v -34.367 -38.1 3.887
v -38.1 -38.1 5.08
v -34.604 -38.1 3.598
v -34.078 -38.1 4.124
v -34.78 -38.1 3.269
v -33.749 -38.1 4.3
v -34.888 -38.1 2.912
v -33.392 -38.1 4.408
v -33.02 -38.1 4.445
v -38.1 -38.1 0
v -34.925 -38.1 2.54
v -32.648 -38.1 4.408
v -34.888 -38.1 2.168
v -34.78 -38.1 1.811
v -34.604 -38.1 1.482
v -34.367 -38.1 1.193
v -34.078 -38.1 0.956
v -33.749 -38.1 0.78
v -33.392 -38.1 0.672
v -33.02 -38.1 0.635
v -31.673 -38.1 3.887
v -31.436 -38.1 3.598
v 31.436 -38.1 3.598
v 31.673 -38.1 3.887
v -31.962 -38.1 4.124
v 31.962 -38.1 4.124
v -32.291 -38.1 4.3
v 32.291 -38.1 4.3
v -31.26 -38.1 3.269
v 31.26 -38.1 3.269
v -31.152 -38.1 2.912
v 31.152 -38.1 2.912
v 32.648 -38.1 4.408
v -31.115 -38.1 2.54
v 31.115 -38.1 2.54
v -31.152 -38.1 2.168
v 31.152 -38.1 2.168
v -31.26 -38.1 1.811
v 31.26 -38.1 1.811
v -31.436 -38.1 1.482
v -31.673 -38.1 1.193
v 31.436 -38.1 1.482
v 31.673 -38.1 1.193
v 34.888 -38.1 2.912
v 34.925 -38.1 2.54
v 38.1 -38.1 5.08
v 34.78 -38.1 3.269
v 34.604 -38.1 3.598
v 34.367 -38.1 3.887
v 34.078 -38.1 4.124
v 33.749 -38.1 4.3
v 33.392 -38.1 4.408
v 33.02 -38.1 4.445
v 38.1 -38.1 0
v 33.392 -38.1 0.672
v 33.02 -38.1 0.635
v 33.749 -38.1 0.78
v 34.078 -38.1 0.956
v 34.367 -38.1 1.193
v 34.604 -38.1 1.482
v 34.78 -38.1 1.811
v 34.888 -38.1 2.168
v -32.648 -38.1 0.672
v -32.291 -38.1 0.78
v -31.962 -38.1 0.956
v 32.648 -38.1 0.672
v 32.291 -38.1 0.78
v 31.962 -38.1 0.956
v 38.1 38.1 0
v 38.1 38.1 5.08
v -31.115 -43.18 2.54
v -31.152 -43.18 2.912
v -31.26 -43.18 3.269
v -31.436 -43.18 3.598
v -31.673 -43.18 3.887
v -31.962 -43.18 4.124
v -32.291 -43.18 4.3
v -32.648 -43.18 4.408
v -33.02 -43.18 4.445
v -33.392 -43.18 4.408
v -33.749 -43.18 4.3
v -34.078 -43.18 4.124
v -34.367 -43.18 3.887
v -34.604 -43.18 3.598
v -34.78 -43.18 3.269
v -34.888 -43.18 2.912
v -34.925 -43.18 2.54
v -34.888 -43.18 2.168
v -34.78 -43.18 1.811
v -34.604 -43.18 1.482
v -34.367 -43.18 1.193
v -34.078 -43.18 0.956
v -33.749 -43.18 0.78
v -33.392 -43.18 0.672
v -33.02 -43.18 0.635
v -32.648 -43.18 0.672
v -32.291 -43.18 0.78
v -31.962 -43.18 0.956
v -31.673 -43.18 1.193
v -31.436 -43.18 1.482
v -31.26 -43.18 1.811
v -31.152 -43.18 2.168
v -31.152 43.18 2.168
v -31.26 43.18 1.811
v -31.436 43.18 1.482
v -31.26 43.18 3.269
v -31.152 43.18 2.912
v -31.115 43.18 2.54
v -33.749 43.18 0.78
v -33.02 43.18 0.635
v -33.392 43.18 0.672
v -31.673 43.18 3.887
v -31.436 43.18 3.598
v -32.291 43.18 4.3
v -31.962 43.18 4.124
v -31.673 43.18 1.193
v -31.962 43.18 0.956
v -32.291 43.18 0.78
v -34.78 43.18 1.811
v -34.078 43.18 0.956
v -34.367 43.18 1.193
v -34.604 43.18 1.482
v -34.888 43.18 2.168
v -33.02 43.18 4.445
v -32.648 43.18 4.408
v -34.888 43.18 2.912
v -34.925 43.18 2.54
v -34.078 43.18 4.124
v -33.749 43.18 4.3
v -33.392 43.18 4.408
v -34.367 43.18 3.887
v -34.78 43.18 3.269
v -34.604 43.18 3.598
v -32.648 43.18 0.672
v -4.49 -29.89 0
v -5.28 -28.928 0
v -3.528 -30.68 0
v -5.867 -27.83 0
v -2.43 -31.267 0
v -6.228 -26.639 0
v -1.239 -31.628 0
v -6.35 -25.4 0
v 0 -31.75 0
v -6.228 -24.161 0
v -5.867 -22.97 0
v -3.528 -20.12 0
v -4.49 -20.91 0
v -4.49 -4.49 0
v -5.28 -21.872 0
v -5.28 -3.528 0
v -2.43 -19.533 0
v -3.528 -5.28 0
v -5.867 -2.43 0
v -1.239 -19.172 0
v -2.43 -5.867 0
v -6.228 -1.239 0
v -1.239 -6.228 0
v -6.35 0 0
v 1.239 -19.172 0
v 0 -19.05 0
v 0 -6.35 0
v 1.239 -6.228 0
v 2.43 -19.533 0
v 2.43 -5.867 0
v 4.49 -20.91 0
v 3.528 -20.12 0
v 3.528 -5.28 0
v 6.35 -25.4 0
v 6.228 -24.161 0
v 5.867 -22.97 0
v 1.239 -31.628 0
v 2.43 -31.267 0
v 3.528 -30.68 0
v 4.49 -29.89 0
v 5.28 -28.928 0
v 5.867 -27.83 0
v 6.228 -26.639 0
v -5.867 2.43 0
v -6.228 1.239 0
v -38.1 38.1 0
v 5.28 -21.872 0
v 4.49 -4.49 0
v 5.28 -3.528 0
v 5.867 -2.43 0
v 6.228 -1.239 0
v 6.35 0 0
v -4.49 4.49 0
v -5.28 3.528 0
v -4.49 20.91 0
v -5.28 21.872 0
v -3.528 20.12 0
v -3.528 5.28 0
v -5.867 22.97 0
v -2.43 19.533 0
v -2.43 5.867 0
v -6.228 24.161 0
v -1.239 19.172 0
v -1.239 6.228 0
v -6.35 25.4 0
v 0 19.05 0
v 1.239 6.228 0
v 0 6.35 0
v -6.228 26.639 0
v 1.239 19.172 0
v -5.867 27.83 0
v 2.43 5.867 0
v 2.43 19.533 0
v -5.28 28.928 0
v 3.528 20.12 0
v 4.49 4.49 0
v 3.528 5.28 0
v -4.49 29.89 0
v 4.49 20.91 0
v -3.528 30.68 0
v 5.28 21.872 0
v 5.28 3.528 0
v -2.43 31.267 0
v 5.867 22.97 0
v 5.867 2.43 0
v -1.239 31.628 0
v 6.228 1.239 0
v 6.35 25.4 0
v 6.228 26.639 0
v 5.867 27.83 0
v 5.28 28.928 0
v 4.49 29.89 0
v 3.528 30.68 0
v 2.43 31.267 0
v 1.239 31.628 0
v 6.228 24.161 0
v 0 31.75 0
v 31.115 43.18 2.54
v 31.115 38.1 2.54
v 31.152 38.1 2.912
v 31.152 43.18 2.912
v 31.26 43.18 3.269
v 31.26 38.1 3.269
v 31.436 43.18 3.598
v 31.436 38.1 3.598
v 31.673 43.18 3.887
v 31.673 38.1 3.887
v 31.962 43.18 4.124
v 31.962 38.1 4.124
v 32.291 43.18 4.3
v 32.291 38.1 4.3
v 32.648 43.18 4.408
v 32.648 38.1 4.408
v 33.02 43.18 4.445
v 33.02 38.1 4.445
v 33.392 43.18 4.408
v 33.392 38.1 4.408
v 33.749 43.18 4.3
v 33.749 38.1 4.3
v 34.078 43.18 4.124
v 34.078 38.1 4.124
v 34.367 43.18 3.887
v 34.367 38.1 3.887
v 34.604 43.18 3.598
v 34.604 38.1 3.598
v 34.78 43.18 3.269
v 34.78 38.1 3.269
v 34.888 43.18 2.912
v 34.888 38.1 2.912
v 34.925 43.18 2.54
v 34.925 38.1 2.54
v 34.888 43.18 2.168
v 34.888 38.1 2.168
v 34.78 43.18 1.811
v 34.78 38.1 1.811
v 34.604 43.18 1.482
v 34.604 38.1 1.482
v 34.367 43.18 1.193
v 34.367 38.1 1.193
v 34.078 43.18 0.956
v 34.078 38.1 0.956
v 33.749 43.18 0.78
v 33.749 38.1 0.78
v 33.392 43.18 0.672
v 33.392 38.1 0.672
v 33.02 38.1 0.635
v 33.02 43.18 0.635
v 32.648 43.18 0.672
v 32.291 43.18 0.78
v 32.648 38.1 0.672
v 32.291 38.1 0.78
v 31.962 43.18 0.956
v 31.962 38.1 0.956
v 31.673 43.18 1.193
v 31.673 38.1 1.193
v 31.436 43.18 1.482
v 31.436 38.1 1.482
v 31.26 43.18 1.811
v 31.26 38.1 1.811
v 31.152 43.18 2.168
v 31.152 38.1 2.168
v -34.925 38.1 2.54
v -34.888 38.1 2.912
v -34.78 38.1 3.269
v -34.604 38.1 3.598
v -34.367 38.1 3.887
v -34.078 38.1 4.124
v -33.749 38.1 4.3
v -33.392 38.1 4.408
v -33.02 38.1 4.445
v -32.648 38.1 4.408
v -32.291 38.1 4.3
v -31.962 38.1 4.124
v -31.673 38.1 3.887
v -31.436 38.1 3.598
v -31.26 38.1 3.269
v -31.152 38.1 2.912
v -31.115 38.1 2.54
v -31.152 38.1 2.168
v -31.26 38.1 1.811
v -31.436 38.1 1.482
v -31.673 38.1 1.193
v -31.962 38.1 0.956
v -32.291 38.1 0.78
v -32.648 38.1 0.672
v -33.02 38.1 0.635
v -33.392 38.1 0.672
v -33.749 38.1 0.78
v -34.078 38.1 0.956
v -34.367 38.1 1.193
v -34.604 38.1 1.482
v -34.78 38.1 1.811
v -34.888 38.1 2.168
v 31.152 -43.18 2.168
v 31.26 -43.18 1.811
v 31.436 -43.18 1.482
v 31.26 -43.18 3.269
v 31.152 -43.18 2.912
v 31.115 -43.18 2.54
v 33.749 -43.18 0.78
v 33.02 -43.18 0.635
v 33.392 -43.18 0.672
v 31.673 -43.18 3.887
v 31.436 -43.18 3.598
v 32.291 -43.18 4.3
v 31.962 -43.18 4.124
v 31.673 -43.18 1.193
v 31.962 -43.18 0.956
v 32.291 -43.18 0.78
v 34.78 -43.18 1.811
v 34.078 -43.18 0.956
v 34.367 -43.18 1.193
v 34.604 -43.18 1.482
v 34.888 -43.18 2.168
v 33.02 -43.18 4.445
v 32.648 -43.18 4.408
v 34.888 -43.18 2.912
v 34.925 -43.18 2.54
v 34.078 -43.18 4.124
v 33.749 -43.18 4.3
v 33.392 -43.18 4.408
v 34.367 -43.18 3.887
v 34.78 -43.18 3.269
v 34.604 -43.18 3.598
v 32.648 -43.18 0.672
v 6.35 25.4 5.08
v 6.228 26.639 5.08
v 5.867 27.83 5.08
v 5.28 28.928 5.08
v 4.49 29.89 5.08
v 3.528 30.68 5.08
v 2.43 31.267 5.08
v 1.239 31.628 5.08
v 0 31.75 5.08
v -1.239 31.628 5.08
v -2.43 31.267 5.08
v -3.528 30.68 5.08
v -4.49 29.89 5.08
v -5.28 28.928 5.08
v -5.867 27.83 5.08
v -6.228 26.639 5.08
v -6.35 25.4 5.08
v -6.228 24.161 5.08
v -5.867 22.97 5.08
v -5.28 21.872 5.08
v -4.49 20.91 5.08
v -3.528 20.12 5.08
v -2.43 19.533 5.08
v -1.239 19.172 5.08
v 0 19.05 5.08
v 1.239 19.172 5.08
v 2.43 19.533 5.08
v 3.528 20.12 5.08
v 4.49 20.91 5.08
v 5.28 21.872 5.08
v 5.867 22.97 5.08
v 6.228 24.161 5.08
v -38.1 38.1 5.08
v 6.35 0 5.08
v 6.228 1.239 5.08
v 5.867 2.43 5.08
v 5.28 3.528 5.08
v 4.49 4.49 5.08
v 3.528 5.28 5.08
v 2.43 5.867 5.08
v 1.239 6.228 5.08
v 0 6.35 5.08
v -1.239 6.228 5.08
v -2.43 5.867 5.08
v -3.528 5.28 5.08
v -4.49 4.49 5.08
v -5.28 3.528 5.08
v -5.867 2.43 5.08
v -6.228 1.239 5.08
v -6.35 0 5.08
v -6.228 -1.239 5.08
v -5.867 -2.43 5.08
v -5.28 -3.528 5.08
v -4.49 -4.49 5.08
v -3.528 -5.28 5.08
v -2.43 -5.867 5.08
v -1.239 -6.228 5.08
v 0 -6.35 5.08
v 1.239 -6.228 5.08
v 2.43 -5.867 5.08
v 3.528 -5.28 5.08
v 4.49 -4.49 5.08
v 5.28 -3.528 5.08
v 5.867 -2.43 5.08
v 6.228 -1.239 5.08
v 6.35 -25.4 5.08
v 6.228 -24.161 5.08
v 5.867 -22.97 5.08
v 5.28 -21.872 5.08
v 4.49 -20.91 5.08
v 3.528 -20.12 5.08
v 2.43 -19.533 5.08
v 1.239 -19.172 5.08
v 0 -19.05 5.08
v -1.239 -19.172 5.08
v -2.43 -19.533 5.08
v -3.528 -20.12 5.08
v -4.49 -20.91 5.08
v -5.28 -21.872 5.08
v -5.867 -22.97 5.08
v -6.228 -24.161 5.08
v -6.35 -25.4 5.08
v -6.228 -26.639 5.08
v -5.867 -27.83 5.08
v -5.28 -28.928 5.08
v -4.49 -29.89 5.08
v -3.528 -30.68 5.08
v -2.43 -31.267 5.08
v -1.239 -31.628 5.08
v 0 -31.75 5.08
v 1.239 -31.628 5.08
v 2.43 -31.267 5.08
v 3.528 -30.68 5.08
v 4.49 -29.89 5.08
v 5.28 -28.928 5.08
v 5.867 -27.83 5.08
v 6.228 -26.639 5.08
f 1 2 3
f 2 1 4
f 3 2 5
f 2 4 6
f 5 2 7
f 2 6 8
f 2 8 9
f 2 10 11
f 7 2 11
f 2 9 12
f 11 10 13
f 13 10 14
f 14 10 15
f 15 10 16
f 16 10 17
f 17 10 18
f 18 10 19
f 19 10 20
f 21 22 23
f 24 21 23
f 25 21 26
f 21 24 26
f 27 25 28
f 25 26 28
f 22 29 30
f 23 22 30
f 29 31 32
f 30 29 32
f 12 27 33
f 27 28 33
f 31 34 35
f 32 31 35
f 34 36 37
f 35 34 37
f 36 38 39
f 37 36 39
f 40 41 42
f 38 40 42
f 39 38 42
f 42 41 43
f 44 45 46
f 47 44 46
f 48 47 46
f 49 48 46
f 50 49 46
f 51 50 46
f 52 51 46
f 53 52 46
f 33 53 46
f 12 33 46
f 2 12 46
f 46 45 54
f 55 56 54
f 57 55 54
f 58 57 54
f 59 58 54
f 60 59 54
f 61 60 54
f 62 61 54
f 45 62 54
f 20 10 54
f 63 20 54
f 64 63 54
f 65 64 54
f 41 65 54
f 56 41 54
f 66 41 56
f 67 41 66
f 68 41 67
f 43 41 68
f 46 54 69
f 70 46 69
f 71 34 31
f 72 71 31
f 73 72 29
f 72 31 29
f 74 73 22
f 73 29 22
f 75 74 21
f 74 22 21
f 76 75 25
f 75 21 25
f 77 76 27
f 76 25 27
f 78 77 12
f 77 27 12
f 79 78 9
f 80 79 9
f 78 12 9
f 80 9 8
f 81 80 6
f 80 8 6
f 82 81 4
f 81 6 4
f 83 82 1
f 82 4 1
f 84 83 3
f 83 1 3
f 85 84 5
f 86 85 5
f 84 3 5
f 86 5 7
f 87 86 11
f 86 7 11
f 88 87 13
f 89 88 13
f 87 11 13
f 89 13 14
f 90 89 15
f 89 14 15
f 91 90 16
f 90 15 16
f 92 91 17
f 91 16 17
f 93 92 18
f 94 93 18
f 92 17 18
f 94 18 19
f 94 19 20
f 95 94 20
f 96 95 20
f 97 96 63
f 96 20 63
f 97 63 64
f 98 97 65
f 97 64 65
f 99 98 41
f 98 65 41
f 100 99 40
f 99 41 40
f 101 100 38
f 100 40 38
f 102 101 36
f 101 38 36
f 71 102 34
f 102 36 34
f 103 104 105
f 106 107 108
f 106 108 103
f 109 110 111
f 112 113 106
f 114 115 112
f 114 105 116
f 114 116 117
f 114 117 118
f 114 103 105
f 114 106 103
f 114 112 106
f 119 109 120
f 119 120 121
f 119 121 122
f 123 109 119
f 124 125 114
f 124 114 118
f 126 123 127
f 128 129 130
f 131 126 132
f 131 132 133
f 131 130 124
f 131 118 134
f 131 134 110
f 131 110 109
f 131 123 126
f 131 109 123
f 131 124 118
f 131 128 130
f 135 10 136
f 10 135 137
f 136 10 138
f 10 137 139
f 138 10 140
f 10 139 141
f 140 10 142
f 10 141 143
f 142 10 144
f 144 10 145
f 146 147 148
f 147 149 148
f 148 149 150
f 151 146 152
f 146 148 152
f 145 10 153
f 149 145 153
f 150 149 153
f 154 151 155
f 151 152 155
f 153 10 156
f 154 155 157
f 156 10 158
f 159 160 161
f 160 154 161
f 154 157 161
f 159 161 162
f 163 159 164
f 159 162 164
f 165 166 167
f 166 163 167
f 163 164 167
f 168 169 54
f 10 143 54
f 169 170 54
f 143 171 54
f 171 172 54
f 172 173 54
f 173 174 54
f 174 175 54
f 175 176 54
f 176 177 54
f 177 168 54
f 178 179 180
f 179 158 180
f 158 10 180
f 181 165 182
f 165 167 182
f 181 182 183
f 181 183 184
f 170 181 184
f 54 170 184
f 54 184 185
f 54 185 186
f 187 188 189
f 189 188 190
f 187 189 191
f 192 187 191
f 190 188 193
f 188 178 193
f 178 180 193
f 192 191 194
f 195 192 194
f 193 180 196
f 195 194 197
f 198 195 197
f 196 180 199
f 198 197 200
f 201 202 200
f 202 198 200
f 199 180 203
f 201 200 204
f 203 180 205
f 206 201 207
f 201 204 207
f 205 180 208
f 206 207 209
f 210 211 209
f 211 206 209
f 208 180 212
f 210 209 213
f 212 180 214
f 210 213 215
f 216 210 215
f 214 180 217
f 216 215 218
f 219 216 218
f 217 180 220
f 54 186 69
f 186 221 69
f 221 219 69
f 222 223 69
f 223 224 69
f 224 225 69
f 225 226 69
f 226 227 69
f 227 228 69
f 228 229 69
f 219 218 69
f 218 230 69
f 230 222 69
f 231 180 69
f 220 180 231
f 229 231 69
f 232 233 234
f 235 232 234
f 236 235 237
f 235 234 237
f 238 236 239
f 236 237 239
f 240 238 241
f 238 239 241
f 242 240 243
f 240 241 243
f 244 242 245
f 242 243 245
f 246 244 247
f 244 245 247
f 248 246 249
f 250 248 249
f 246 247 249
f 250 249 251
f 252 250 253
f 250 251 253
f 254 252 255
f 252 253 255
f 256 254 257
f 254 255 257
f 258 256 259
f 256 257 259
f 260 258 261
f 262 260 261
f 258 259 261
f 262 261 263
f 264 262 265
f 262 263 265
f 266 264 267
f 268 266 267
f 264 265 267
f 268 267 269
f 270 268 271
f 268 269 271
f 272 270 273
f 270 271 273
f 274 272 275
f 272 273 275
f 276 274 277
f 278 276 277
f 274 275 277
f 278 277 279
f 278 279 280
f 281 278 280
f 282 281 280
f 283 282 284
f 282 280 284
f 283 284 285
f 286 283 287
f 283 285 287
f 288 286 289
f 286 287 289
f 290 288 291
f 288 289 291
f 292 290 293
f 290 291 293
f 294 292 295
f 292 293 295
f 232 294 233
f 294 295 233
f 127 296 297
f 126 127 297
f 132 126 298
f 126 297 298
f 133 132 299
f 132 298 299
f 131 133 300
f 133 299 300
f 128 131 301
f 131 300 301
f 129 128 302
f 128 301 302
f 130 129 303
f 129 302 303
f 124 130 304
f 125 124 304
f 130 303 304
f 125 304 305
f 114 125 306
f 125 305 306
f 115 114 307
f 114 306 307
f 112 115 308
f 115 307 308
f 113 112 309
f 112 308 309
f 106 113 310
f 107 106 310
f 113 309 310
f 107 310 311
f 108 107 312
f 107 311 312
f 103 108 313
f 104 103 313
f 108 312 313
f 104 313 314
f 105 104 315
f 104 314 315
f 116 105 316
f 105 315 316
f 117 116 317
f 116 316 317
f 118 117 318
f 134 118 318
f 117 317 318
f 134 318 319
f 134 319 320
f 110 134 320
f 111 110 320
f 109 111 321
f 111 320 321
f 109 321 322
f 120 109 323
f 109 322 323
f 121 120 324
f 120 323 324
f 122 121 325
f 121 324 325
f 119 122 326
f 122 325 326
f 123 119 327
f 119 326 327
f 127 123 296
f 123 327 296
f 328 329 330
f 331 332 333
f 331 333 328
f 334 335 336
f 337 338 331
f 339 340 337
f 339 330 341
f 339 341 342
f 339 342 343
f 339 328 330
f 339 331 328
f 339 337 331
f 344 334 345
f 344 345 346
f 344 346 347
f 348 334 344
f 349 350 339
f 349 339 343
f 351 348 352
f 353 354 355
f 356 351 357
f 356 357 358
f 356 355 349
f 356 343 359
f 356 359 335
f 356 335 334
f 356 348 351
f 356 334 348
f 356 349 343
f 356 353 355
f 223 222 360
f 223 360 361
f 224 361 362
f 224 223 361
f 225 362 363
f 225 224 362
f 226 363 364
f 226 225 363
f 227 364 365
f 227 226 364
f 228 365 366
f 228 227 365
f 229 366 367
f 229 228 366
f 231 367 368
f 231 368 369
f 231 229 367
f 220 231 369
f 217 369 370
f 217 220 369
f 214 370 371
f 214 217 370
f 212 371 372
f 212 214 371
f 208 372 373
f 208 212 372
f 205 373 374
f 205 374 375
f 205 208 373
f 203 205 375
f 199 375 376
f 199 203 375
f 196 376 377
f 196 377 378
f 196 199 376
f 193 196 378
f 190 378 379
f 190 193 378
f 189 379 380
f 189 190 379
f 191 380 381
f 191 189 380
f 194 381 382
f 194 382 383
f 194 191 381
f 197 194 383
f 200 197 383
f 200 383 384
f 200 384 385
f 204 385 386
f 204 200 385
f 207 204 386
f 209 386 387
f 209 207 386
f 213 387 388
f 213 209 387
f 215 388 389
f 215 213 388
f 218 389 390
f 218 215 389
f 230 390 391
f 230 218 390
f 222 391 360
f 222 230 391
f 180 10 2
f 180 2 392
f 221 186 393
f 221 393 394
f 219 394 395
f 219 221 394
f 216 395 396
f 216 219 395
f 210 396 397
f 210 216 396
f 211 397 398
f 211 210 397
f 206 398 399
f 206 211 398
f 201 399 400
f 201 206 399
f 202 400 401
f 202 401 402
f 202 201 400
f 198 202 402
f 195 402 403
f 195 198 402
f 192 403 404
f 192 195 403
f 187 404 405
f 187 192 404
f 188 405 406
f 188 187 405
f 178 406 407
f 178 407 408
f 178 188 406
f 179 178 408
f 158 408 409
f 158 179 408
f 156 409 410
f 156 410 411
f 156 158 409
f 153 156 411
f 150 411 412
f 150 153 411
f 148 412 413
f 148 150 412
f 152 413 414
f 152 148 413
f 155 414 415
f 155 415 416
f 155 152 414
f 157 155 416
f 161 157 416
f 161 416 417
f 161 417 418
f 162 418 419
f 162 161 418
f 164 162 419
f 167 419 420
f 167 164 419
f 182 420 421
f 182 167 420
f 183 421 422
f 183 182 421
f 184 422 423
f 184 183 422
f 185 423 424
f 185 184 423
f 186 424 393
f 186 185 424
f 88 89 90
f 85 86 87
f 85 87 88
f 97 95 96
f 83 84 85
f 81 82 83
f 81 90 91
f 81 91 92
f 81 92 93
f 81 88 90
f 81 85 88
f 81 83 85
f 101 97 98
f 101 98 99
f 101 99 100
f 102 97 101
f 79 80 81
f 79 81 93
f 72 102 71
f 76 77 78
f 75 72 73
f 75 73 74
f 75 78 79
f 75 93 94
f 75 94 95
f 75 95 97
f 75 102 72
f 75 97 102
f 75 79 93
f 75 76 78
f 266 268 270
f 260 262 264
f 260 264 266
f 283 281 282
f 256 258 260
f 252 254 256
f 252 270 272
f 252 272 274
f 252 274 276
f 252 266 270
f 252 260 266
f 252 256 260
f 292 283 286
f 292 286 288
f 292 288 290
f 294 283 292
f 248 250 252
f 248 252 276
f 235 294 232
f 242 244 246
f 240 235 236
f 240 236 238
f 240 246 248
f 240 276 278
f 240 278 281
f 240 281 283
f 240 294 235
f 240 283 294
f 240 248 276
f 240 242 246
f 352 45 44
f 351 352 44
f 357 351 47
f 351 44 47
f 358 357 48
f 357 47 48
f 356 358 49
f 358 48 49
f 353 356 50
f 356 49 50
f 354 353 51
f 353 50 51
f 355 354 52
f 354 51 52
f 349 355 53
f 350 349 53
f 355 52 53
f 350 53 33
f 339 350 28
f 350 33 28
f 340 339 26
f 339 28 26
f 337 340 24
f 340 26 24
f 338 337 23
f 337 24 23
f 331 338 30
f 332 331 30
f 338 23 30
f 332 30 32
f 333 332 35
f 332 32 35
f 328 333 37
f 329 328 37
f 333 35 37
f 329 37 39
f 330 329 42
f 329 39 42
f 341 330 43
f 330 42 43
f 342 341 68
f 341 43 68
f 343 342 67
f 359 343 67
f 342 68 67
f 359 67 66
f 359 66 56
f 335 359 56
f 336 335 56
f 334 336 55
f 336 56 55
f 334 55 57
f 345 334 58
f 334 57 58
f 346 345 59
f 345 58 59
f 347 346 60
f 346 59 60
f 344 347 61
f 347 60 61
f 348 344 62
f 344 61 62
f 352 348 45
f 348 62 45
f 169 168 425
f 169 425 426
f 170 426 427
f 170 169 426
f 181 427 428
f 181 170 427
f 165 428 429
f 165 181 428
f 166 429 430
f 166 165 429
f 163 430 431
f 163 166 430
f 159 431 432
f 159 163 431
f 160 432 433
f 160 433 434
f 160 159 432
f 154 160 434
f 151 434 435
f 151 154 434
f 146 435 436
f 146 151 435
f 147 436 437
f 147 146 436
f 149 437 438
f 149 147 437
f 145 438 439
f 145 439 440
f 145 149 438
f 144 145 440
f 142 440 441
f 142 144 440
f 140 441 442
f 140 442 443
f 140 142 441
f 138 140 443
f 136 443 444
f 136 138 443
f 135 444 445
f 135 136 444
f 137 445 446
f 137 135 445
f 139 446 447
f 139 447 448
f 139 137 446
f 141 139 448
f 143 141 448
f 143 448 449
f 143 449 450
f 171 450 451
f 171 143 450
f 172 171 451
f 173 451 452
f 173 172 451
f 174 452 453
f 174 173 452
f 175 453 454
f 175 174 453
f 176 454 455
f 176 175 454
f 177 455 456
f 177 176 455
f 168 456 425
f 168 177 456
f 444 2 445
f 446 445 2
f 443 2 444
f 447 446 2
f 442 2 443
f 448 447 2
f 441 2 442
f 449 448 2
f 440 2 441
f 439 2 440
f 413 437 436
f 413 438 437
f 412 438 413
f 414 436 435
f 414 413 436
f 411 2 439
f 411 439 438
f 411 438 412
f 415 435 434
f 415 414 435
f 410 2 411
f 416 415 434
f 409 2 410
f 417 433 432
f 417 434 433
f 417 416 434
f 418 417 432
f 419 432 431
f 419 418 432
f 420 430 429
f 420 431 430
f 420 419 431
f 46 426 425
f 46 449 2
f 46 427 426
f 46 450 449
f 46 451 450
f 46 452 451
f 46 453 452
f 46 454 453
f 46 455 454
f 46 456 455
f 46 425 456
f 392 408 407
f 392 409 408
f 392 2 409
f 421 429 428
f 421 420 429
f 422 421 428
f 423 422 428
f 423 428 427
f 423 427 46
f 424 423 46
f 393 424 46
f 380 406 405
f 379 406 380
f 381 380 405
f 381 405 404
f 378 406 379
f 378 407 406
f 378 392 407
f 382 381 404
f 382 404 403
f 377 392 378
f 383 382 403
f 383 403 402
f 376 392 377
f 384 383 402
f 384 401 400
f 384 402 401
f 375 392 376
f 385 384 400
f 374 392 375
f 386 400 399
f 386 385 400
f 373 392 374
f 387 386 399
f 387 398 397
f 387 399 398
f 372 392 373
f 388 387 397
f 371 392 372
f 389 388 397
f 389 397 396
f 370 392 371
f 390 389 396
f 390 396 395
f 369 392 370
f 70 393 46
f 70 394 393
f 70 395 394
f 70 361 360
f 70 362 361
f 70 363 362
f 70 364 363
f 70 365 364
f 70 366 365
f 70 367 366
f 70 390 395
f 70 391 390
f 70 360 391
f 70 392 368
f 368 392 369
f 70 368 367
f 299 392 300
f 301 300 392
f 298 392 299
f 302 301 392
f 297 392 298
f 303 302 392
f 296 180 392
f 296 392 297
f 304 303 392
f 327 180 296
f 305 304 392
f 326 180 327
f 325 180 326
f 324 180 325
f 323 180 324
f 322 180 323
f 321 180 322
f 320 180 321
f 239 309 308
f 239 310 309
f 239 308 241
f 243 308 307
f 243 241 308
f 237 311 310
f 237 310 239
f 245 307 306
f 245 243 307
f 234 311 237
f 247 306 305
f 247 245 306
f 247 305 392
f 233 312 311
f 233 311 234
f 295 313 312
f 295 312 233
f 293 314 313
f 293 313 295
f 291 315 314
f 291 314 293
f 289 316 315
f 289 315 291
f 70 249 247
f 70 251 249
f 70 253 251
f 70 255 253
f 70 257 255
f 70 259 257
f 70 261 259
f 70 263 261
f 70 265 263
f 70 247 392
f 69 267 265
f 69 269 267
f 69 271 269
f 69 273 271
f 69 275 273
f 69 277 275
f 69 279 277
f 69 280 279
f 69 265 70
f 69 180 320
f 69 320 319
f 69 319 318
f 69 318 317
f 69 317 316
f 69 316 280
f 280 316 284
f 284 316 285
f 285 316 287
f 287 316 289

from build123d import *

# Parameters (mm, degrees)
F0_W     = 76.2
F0_H     = 76.2
F0_R     = 6.35
F1_DEPTH = 5.08
F2_R     = 1.905
F3_DEPTH = 5.08
F4_R     = 1.905
F5_DEPTH = 5.08


with BuildPart() as f1:
    # F0 (on Top) → F1 (new body)
    with BuildSketch(Plane.XY):
        Rectangle(F0_W, F0_H)
        with Locations((0, -25.4)):
            Circle(F0_R, mode=Mode.SUBTRACT)
        Circle(F0_R, mode=Mode.SUBTRACT)
        with Locations((0, 25.4)):
            Circle(F0_R, mode=Mode.SUBTRACT)
    extrude(amount=F1_DEPTH)

    # F2 (on face) → F3 (join)
    with BuildSketch(Plane.XZ.offset(38.1)):
        with Locations((-33.02, 2.54)):
            Circle(F2_R)
        with Locations((33.02, 2.54)):
            Circle(F2_R)
    extrude(amount=F3_DEPTH)

    # F4 (on face) → F5 (join)
    with BuildSketch(Plane(origin=(0, 38.1, 0), x_dir=(-1, 0, 0), z_dir=(0, 1, 0))):
        with Locations((-33.02, 2.54)):
            Circle(F4_R)
        with Locations((33.02, 2.54)):
            Circle(F4_R)
    extrude(amount=F5_DEPTH)


solid = f1.part
